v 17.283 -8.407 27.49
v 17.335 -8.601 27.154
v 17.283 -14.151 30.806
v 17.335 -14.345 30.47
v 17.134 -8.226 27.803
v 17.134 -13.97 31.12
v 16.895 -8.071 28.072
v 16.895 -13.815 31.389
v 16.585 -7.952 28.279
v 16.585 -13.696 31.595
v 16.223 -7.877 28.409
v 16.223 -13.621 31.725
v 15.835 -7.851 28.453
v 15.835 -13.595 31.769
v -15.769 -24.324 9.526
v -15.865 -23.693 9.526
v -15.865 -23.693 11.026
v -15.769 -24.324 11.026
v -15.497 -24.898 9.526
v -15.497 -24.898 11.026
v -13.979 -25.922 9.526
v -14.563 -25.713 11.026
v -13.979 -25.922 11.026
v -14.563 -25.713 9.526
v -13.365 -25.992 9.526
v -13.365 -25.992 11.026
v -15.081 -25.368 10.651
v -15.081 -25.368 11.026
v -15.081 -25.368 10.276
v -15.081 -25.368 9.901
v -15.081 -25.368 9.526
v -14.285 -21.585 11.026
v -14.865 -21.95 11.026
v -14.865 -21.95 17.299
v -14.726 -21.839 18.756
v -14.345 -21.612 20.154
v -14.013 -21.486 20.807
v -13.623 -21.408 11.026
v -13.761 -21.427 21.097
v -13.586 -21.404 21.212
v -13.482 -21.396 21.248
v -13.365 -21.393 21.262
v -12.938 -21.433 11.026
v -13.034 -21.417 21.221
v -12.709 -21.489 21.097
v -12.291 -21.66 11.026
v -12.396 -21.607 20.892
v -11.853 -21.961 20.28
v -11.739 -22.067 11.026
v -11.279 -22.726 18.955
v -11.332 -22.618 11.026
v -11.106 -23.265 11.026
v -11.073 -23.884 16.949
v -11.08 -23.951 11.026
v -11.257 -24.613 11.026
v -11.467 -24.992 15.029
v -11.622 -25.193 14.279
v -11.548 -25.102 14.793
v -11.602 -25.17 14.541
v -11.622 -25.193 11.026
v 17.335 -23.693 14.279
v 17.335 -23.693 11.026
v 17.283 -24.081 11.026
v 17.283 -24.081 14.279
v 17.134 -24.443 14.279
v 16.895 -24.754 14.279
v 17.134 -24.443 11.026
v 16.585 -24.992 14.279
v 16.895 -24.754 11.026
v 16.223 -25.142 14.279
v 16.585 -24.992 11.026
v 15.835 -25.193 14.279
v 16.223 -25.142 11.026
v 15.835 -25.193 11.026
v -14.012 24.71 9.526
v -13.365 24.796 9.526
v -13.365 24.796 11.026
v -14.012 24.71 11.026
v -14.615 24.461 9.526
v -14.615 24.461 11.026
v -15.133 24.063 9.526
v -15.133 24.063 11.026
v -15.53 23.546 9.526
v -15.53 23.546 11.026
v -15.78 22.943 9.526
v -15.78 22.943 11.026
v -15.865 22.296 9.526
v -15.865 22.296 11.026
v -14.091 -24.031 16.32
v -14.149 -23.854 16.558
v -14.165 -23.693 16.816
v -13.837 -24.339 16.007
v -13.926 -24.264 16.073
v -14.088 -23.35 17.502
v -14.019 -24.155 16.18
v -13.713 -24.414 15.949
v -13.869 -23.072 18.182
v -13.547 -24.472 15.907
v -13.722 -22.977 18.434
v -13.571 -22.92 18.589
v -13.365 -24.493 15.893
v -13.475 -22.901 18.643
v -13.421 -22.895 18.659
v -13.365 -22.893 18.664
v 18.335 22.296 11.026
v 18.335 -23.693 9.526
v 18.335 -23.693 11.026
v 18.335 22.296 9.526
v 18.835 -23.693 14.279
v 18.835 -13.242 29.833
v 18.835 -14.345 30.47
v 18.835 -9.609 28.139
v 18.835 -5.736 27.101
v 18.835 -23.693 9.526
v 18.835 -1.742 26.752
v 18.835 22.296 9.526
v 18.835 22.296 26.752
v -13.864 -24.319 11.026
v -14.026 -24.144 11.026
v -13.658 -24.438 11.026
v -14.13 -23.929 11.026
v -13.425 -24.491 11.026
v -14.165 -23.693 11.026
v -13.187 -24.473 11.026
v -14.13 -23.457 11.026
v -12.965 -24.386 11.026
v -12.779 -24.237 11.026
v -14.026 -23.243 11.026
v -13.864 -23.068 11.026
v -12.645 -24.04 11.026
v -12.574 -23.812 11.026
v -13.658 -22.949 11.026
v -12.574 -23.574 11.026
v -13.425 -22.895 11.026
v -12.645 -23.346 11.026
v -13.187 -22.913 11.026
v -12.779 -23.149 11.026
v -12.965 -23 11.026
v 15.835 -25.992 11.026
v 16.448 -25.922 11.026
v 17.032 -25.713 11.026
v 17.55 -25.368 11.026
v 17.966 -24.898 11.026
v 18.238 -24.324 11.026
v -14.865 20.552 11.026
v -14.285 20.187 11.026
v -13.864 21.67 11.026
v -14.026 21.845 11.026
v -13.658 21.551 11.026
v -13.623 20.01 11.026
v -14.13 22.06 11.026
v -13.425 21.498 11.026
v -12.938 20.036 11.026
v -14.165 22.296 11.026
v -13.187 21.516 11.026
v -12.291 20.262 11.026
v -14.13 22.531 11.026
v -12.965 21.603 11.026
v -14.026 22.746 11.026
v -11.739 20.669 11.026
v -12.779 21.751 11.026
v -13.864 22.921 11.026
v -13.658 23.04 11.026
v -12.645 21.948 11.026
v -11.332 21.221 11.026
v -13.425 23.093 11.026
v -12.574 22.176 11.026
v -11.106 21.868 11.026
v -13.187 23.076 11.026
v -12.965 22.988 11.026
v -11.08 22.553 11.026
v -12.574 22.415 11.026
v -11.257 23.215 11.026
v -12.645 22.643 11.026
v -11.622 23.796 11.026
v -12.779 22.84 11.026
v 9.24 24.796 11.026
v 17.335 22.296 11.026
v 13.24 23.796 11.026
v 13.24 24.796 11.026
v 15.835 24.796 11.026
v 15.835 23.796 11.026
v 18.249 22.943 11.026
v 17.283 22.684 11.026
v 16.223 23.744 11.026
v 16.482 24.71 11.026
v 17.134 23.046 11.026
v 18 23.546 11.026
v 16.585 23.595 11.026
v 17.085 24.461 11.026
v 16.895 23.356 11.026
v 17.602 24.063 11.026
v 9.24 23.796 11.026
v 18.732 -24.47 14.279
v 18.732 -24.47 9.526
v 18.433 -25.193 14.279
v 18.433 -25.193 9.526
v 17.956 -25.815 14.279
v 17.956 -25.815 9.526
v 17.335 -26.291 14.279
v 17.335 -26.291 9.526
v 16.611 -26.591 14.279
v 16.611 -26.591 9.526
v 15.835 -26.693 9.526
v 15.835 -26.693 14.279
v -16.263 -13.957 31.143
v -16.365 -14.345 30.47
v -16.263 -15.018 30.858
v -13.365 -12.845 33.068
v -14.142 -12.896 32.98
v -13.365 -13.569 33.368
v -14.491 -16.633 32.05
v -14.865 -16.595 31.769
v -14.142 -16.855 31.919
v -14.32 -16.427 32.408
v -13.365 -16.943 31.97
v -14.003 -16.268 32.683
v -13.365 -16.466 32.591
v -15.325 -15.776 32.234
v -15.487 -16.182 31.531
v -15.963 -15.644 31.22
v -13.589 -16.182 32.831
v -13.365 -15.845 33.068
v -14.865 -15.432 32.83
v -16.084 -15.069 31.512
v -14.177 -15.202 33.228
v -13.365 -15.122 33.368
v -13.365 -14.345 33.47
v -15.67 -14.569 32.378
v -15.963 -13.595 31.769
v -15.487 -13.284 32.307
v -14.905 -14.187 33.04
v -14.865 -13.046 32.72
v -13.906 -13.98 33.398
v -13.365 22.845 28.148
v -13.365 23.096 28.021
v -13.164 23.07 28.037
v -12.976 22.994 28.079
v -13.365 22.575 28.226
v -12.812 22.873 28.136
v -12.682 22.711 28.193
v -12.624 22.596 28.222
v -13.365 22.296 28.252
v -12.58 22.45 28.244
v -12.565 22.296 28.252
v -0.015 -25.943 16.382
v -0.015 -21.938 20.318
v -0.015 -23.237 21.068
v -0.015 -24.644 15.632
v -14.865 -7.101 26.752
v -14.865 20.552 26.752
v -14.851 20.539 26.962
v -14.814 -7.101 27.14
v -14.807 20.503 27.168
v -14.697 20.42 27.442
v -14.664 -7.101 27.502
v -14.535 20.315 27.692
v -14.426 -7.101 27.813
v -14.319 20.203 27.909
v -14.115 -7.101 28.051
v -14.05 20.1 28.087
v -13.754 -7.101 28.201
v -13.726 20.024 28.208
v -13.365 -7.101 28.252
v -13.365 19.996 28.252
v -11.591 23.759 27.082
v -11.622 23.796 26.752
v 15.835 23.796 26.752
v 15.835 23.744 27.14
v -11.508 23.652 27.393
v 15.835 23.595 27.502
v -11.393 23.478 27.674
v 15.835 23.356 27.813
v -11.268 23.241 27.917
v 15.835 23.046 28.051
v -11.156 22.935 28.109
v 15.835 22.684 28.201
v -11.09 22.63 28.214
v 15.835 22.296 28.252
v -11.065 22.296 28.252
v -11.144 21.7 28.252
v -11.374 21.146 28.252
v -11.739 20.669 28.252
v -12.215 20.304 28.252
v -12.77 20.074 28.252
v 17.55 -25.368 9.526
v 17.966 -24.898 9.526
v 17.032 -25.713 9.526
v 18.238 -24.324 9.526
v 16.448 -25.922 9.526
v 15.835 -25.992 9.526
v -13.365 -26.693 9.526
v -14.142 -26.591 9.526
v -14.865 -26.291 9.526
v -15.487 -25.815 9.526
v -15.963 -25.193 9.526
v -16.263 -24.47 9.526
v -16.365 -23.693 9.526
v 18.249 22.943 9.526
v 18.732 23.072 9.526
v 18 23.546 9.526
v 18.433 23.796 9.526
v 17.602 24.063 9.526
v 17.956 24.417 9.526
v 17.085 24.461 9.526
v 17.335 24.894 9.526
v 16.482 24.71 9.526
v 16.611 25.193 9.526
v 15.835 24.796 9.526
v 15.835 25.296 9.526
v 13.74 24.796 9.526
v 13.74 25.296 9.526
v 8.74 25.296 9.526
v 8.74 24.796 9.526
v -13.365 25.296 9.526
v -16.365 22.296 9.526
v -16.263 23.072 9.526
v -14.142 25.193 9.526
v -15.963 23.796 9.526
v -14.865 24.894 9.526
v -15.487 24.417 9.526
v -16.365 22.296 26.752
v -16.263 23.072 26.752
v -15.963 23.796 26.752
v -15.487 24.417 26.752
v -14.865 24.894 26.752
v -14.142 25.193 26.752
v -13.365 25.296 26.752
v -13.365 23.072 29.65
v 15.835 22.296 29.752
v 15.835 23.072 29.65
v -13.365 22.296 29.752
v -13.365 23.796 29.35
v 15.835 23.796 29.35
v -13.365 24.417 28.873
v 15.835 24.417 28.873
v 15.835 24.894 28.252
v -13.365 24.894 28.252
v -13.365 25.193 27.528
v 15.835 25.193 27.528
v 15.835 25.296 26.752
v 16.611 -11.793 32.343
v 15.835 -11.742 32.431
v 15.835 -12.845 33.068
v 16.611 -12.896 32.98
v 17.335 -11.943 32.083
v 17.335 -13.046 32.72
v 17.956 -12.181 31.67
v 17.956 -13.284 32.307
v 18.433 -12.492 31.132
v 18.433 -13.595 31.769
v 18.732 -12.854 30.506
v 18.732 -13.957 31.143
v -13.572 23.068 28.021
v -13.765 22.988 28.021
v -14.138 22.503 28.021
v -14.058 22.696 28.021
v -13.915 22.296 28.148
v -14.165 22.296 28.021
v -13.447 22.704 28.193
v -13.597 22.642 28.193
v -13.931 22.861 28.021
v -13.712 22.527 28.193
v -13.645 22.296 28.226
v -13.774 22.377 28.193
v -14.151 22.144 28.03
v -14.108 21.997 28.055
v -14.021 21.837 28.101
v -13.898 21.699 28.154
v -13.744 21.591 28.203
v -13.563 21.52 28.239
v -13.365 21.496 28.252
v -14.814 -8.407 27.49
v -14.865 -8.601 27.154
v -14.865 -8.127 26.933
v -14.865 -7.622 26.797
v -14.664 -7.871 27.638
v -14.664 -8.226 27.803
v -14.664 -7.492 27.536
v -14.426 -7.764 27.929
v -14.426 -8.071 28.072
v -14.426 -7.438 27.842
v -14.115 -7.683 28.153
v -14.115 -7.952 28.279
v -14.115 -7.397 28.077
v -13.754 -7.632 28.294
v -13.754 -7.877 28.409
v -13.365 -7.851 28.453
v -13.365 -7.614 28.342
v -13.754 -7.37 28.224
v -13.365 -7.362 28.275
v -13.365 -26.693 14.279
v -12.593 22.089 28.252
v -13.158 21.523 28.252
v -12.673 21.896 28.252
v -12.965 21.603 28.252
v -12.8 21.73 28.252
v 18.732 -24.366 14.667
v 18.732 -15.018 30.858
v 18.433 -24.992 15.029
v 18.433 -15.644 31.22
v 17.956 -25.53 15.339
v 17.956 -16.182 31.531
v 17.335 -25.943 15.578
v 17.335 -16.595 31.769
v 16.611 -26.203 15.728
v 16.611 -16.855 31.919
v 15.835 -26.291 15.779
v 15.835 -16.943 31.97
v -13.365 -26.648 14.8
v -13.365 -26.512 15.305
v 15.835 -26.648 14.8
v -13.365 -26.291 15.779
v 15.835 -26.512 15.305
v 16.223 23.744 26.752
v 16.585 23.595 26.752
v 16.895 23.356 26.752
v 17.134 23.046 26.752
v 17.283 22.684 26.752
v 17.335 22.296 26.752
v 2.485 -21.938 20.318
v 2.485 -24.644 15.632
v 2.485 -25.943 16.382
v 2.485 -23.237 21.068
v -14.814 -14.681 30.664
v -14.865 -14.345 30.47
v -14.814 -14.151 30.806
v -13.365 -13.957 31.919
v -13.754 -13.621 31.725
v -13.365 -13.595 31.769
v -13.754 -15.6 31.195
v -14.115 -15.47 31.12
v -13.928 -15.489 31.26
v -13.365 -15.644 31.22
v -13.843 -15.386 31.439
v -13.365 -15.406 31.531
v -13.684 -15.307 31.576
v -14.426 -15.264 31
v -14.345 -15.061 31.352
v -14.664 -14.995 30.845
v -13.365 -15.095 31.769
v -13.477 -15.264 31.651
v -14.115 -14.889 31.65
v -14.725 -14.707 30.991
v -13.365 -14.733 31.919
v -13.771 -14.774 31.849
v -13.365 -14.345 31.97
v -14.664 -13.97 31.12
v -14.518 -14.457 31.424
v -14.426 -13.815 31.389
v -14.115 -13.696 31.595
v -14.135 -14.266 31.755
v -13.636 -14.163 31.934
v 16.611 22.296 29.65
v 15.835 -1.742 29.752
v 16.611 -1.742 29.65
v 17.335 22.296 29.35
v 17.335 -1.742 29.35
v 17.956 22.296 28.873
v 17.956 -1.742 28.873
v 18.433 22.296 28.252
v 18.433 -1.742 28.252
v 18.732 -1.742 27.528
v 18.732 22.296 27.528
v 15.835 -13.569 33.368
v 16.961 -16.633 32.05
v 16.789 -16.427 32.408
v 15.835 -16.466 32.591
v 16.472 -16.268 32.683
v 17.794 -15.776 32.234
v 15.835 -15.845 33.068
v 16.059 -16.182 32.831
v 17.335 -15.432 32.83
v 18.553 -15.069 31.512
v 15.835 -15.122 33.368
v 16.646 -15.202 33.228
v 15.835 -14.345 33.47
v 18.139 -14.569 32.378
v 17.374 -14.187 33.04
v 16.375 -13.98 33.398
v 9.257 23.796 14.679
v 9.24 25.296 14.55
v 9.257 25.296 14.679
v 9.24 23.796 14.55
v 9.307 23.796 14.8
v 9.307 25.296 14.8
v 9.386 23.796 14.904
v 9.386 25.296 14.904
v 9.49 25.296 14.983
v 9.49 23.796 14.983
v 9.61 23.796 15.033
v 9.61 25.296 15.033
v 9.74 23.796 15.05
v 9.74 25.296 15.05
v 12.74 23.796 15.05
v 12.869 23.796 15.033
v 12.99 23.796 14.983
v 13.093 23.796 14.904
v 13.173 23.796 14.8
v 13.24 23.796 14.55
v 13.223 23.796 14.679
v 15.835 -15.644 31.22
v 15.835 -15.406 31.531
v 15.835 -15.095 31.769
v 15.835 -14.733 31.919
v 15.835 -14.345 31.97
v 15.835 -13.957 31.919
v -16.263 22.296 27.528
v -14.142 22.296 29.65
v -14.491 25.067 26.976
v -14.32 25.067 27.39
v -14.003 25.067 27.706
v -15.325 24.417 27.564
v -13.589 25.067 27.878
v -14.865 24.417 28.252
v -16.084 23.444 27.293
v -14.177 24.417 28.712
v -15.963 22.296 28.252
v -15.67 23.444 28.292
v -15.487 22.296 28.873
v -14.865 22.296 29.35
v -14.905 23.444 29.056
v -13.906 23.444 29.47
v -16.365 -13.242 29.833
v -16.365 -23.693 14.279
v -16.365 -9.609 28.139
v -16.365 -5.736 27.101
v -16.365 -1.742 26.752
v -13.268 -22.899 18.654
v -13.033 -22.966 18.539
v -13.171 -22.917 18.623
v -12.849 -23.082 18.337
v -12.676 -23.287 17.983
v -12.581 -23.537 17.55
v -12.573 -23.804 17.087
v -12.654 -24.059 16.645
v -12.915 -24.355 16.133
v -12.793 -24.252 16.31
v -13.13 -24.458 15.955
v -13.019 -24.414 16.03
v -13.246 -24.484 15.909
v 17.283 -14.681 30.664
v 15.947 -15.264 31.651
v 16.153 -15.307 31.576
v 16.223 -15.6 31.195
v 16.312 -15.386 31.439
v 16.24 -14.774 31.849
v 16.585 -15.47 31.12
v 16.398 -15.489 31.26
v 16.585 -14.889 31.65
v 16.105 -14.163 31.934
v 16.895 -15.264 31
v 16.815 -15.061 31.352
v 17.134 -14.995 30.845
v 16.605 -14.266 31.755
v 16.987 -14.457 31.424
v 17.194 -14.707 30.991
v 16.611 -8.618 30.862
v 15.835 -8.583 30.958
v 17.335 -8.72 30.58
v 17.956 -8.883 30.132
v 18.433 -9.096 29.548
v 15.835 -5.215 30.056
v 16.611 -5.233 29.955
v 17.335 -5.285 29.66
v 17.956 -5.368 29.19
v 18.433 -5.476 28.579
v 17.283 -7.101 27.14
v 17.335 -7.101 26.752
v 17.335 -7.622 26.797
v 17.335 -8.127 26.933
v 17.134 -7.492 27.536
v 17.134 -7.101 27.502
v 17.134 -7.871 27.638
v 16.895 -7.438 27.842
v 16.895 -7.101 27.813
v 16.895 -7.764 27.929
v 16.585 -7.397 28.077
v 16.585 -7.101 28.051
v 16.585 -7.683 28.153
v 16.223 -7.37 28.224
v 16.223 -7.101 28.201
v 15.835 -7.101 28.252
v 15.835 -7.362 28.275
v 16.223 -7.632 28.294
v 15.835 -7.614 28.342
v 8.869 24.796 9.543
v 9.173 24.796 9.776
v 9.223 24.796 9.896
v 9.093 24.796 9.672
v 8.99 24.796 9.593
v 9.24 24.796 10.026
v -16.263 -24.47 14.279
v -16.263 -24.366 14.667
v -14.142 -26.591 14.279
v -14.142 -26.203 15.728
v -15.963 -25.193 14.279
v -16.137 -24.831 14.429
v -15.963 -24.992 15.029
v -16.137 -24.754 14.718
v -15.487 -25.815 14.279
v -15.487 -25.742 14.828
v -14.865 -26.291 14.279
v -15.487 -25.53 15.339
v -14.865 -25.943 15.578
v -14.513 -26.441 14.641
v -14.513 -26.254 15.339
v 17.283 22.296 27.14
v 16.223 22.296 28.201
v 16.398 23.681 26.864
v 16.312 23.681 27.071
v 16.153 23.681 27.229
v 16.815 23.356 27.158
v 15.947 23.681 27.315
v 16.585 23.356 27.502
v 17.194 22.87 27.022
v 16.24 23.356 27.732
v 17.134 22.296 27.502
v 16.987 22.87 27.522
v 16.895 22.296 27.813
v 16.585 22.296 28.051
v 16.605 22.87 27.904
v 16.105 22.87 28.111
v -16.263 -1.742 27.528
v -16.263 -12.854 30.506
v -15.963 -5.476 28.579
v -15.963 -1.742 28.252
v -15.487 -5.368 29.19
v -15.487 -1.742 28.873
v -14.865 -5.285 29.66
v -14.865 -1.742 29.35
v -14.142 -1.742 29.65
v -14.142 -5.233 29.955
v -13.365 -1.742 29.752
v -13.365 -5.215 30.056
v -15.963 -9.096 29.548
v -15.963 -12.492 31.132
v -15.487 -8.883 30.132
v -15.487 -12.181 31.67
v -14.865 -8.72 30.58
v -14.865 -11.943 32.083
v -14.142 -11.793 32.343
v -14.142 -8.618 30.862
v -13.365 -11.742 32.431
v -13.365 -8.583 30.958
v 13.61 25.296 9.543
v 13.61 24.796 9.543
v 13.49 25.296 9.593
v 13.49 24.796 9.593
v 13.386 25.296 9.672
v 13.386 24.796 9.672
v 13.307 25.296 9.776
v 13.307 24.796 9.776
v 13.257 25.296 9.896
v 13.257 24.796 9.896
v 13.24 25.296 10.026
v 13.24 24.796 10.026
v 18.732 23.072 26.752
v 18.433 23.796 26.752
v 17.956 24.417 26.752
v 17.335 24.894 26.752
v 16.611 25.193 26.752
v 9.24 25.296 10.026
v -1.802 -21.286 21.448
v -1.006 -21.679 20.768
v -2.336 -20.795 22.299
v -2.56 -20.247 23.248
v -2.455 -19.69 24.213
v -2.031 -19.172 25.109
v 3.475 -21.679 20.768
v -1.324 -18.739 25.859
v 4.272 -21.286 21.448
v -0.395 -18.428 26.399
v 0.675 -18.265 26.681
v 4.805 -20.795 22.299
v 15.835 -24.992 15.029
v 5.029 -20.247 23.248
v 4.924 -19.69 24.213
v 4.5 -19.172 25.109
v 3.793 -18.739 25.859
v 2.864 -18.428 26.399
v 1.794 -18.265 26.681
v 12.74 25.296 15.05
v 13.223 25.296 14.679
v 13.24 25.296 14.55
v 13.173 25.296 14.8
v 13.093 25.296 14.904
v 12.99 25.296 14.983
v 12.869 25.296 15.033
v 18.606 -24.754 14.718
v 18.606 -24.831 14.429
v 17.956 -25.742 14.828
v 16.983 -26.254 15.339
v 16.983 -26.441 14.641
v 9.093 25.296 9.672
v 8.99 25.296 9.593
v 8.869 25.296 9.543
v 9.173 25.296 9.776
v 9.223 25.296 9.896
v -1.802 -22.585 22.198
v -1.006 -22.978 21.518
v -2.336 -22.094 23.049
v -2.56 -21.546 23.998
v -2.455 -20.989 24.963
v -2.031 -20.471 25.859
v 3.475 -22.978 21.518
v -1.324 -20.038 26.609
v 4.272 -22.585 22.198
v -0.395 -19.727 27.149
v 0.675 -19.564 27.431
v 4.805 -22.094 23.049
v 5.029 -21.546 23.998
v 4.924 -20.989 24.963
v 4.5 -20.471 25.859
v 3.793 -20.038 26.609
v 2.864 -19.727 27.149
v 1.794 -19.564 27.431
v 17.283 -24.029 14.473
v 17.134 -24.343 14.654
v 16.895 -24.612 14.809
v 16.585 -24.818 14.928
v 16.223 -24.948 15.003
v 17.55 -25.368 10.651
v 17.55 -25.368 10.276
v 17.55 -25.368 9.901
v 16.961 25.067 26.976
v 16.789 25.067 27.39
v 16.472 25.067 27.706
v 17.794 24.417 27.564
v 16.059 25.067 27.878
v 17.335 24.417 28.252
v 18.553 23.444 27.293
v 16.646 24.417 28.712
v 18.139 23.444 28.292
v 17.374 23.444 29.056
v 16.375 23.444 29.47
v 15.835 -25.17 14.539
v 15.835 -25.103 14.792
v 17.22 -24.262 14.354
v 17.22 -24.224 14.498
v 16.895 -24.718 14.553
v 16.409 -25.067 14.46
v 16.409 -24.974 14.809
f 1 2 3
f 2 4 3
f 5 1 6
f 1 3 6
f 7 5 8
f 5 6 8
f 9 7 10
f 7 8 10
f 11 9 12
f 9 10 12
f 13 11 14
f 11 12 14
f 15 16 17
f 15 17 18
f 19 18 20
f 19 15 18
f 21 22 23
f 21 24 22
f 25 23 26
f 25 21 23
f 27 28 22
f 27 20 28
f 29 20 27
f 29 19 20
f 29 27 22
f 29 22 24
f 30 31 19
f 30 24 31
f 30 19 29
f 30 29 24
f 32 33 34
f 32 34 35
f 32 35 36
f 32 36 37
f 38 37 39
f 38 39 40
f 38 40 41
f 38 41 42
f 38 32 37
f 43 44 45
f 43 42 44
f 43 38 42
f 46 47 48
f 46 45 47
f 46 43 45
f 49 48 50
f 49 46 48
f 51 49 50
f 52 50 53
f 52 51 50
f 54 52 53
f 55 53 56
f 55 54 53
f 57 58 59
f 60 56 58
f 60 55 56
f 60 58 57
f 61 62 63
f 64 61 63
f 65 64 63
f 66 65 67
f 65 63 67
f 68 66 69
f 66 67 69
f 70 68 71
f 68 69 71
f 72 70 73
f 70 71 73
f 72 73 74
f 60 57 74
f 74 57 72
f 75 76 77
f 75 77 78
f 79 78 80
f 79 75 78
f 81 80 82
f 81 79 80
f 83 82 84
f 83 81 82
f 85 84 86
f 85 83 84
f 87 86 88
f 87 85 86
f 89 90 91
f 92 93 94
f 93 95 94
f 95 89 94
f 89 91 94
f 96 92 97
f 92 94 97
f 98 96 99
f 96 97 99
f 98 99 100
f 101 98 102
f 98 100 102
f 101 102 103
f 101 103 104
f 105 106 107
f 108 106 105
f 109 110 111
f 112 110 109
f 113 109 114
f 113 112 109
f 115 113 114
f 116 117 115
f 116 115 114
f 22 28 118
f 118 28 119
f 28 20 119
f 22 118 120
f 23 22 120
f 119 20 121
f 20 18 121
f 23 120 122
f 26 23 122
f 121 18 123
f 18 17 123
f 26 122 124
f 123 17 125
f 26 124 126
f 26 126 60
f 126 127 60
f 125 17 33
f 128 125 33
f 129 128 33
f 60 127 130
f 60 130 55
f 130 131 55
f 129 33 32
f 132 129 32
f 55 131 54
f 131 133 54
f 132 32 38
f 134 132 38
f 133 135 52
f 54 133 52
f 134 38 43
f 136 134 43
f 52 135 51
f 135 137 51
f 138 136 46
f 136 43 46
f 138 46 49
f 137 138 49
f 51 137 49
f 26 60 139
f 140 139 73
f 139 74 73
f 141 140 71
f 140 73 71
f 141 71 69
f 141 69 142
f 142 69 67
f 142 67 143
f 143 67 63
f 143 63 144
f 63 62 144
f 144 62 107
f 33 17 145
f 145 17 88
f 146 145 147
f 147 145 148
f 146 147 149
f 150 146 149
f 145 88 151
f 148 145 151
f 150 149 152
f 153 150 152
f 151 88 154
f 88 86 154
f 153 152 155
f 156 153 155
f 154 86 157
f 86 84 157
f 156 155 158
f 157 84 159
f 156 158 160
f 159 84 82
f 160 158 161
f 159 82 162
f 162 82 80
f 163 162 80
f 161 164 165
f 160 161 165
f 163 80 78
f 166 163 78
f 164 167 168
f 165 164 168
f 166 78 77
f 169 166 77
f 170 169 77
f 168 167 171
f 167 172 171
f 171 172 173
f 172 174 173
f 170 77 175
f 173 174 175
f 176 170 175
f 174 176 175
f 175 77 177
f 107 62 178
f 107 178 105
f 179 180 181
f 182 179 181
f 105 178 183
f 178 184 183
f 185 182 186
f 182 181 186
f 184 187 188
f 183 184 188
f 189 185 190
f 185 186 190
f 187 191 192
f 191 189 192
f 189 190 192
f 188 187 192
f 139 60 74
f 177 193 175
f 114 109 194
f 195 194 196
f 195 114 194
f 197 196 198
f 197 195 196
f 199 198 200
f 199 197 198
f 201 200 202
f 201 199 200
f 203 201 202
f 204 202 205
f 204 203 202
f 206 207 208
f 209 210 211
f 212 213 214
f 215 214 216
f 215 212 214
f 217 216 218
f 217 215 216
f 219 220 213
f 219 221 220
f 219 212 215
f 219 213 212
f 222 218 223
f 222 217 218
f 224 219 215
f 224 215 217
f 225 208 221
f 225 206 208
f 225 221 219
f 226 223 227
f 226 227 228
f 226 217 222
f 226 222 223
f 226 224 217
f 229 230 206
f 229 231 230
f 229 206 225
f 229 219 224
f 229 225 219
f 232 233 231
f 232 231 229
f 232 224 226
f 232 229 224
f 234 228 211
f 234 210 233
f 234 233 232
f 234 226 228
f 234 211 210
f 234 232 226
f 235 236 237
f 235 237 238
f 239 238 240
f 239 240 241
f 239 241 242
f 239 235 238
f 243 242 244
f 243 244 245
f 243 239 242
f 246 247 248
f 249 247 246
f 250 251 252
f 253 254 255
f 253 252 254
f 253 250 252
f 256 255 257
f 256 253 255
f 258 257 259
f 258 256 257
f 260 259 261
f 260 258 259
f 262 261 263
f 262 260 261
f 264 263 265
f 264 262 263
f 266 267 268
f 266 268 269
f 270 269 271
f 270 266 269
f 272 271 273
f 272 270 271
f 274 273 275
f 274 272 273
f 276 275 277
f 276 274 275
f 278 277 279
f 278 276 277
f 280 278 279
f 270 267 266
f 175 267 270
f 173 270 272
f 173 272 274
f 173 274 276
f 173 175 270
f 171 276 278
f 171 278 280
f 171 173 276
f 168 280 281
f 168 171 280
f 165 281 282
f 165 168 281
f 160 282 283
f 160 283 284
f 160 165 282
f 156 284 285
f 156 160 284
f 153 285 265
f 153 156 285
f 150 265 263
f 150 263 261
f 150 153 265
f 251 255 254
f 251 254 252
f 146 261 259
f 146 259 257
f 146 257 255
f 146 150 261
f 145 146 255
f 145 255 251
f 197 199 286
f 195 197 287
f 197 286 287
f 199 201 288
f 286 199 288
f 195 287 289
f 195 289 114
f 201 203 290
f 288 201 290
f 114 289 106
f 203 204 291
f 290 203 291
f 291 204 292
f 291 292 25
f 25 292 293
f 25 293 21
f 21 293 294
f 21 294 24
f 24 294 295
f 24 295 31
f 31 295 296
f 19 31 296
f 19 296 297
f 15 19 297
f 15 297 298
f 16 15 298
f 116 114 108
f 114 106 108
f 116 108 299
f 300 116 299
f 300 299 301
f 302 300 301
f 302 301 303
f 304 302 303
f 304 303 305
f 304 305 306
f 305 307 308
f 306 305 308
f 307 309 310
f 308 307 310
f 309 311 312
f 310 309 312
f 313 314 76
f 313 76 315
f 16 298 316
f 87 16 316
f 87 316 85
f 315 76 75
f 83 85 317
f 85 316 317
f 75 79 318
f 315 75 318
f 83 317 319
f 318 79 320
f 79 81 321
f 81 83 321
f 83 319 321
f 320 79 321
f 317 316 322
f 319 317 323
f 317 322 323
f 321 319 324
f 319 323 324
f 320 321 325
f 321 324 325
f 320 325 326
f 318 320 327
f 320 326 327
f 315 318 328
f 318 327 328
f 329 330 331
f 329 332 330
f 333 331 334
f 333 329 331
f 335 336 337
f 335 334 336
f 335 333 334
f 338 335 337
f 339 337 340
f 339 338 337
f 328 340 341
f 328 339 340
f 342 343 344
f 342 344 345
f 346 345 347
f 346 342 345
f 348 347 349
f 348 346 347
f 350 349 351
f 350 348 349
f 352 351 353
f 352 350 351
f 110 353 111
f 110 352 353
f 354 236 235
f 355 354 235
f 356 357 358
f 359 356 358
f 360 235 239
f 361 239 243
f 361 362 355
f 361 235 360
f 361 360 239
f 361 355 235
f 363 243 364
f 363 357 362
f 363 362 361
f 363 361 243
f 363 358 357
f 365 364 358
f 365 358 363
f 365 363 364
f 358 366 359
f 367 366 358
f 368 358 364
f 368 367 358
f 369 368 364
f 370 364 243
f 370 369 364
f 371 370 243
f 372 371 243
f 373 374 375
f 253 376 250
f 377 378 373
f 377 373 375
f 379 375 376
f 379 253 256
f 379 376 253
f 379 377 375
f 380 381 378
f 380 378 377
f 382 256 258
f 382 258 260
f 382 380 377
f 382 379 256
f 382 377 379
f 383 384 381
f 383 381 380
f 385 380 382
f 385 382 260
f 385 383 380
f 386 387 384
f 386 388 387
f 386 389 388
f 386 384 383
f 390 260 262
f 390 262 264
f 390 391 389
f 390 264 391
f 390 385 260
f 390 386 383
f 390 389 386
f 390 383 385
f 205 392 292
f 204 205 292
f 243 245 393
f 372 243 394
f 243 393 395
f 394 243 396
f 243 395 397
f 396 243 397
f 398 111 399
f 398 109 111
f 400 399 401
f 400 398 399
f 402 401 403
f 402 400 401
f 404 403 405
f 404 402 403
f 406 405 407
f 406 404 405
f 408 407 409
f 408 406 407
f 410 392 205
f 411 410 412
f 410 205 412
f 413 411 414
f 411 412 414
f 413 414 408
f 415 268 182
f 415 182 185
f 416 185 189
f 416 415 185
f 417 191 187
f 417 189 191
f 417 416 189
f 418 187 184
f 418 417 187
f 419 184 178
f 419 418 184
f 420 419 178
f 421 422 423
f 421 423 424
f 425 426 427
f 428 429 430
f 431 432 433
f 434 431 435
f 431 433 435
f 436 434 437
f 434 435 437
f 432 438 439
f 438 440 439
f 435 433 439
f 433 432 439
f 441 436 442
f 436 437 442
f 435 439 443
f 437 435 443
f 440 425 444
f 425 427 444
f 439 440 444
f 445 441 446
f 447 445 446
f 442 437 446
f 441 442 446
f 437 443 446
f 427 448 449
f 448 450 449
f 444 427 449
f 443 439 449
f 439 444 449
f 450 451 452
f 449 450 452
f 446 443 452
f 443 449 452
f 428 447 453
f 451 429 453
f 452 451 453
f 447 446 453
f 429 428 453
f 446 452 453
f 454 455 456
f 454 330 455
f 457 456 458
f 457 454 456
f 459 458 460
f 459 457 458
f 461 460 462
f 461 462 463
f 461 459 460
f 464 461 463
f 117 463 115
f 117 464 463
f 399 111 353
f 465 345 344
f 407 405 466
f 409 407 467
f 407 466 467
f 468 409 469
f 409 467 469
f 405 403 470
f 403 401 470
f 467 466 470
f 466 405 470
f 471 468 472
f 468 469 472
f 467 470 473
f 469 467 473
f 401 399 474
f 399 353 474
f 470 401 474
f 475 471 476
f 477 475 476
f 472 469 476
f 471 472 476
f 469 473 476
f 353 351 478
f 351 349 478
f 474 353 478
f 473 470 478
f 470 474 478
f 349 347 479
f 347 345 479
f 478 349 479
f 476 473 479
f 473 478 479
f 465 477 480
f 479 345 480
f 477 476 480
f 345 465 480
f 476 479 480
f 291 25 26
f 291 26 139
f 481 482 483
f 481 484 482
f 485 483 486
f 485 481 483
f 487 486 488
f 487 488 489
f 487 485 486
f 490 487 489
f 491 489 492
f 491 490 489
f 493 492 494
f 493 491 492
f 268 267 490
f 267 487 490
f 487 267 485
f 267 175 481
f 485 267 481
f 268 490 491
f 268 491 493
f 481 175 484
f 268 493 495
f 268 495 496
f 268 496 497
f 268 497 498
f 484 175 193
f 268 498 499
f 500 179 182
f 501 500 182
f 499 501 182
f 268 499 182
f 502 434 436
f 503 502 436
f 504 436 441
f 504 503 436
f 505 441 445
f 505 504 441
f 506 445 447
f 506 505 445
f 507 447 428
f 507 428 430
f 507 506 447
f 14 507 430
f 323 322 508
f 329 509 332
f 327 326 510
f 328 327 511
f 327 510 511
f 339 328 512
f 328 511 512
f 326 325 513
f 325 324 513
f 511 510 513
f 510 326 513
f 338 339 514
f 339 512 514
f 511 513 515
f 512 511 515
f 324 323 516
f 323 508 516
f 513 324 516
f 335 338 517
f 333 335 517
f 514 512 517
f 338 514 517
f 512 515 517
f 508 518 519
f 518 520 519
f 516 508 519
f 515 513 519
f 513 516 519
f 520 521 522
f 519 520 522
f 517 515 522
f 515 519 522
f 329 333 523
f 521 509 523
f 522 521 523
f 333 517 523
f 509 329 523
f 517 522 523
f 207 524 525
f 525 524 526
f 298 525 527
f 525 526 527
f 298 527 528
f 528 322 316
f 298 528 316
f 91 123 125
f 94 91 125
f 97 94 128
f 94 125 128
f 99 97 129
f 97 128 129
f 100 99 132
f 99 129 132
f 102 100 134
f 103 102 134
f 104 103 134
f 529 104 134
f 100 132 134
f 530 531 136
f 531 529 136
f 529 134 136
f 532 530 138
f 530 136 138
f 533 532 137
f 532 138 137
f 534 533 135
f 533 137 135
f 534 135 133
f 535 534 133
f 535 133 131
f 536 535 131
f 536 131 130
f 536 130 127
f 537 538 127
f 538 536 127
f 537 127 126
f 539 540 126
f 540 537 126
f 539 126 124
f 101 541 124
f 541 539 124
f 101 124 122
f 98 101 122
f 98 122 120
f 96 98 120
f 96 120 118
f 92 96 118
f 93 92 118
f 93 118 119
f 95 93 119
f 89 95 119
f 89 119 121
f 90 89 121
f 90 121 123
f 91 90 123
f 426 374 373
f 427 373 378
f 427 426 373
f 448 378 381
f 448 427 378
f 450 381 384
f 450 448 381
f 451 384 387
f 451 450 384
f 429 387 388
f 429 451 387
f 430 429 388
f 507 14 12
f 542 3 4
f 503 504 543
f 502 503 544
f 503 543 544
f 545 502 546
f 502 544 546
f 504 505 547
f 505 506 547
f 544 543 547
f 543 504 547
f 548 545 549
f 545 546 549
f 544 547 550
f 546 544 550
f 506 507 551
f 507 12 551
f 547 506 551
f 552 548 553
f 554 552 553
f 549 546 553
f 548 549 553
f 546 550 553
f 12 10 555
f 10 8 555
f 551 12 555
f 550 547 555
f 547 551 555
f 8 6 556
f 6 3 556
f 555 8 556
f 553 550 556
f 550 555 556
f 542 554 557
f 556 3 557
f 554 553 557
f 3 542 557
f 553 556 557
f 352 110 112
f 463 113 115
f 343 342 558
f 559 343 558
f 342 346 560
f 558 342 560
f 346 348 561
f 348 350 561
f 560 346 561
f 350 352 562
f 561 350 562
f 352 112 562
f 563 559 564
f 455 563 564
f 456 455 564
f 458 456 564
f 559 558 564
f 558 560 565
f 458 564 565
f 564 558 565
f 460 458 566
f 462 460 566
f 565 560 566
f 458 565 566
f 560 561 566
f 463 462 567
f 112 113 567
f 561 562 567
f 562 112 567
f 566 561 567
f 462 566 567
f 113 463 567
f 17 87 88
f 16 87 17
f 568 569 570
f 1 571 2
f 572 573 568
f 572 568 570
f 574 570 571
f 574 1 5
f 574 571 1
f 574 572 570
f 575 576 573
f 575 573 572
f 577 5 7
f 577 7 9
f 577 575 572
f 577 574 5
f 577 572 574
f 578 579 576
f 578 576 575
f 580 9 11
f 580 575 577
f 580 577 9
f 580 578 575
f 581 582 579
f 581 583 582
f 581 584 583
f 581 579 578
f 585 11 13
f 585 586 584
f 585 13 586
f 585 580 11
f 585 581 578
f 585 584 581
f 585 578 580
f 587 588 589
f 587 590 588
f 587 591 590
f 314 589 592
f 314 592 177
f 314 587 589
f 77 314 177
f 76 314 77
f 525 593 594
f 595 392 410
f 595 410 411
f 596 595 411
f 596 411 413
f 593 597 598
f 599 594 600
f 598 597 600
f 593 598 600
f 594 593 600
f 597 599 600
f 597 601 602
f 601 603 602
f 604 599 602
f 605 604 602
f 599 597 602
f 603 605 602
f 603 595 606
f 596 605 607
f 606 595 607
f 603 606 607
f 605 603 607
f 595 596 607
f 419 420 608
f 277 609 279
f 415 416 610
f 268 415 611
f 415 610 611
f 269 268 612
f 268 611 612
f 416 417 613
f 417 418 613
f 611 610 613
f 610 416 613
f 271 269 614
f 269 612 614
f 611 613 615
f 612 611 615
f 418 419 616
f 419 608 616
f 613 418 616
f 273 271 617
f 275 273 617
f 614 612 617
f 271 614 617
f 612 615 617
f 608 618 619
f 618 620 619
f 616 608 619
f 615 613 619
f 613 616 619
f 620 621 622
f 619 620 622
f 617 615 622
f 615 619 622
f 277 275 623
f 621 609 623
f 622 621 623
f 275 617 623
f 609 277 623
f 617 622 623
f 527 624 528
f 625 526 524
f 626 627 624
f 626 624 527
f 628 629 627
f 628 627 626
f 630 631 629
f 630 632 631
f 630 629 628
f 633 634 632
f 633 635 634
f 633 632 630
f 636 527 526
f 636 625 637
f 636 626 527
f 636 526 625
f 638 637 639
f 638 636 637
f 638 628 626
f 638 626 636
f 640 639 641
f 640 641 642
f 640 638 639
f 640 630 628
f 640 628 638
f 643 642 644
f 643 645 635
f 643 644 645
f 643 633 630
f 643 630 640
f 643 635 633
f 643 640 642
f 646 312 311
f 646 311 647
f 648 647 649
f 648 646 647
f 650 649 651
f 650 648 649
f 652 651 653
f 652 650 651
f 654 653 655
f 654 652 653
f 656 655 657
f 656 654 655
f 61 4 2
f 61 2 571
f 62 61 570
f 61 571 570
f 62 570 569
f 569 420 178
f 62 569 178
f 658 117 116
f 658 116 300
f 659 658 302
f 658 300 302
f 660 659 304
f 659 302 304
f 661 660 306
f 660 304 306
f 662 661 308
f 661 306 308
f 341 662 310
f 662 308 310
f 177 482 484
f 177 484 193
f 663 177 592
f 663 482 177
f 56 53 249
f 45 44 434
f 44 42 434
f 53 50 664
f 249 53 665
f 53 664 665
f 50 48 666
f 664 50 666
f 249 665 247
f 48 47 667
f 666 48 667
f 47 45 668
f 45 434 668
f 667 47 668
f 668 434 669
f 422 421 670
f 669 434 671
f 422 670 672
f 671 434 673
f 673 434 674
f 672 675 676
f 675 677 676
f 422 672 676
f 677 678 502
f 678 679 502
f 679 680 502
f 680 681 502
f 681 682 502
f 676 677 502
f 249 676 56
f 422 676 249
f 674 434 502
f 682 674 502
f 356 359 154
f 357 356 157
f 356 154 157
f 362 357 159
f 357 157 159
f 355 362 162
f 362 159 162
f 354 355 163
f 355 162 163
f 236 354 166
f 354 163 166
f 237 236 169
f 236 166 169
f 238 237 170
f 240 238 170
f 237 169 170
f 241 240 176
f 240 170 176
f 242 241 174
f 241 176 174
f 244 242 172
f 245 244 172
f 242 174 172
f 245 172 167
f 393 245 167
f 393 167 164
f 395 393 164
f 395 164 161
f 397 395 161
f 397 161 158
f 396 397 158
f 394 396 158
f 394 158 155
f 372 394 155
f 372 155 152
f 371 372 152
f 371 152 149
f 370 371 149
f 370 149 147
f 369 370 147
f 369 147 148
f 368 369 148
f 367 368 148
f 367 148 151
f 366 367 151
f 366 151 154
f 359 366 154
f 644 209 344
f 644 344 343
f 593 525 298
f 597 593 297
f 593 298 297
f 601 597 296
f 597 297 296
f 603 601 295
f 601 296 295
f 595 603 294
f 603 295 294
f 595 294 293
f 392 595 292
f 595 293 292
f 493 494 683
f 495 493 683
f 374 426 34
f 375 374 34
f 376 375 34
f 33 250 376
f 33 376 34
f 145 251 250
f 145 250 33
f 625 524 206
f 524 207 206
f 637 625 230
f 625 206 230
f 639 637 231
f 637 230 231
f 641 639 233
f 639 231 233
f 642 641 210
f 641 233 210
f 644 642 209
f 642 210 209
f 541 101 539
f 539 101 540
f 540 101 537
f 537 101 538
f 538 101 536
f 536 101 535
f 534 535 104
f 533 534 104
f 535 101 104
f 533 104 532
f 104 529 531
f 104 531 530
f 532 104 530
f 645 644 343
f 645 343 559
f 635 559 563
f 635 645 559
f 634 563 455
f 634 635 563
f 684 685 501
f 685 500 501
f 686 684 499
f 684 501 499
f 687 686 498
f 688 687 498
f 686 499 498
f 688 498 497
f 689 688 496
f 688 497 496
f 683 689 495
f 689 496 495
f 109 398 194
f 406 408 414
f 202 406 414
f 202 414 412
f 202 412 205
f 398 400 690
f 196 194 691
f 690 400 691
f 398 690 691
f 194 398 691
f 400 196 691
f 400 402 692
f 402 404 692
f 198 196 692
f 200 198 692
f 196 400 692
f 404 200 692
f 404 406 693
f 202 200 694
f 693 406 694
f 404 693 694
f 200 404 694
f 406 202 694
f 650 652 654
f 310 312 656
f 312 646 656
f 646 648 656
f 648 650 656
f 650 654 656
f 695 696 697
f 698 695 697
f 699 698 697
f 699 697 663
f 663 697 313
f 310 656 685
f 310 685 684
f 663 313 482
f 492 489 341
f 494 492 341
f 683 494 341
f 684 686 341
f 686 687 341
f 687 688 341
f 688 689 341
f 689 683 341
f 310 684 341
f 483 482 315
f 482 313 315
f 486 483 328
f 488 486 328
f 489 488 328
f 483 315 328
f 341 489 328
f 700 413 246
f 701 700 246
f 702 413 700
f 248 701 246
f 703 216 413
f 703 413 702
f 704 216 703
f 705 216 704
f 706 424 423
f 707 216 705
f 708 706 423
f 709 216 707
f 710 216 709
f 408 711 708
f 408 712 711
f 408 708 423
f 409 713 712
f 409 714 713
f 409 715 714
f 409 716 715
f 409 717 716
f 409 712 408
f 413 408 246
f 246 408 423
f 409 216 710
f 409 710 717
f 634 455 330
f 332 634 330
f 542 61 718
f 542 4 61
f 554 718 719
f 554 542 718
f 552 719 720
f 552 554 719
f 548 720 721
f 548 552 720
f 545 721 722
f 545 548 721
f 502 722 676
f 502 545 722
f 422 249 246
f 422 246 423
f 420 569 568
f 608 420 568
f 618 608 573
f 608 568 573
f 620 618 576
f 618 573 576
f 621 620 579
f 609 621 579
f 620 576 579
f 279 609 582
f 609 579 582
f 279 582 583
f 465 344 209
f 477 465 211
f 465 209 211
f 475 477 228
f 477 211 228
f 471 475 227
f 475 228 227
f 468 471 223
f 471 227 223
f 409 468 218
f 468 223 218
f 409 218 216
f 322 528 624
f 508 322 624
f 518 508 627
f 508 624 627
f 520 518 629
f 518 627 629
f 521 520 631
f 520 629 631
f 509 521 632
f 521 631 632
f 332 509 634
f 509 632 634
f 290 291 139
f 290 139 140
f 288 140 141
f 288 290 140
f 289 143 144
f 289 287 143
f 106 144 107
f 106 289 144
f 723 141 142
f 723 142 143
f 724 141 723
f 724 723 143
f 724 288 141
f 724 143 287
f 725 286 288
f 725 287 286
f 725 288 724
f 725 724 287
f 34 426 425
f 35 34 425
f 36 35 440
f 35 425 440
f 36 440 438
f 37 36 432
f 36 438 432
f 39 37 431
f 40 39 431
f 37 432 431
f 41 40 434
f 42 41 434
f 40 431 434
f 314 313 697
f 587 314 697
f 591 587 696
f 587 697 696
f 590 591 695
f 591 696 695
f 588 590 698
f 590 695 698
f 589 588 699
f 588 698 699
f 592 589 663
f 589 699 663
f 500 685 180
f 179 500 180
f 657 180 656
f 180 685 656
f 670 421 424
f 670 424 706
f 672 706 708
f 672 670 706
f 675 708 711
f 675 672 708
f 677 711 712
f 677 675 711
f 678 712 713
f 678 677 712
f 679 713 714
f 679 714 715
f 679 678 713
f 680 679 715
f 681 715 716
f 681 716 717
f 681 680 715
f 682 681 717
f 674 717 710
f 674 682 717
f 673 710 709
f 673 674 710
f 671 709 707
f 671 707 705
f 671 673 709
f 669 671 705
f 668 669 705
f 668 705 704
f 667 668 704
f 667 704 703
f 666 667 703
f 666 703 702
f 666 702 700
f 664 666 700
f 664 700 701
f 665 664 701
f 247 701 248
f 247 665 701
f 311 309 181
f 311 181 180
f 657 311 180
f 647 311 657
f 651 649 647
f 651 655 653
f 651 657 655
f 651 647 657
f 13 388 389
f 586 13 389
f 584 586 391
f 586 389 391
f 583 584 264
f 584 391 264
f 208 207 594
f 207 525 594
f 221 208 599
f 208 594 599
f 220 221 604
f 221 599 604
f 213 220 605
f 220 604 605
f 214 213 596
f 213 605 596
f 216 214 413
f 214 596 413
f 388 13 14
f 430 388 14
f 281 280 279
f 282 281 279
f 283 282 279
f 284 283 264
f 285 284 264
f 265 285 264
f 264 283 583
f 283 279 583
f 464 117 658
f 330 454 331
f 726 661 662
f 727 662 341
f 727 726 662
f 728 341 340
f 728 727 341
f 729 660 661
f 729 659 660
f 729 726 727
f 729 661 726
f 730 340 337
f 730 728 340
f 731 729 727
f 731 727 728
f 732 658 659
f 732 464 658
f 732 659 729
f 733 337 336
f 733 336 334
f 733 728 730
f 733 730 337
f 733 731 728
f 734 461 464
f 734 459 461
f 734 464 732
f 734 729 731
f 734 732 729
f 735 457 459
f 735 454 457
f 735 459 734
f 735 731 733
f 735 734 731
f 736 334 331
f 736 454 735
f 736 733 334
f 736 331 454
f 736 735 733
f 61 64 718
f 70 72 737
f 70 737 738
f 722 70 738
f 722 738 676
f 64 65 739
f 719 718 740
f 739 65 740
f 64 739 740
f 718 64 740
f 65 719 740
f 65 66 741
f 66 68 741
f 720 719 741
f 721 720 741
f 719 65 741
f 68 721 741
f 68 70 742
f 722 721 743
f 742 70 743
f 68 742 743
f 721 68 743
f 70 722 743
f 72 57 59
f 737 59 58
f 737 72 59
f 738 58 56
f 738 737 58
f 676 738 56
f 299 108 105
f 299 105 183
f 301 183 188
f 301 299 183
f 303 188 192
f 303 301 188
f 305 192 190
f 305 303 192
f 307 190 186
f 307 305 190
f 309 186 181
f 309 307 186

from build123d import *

# Parameters (mm, degrees)
SKETCH1_W           = 32.2
SKETCH1_H           = 21
BOSS_EXTRUDE2_DEPTH = 1.5
BOSS_EXTRUDE3_DEPTH = 1.5
BOSS_EXTRUDE4_DEPTH = 1.5
BOSS_EXTRUDE5_DEPTH = 35.2
SKETCH5_W           = 35.2
SKETCH5_H           = 5.556871517
BOSS_EXTRUDE6_DEPTH = 1.5
SKETCH6_W           = 35.2
SKETCH6_H           = 20.226133569
BOSS_EXTRUDE7_DEPTH = 1.5
FILLET3_R           = 20
FILLET_EXTERIOR_R   = 3
FILLET_INTERIOR_R   = 1.5
SKETCH7_W           = 4
SKETCH7_H           = 8.5
CUT_EXTRUDE1_DEPTH  = 1.5
FILLET4_R           = 0.5
CUT_EXTRUDE2_DEPTH  = 1.5
SCREW_BOSS1_REACH   = 41.636
SKETCH10_R          = 2.3
SKETCH10_R_2        = 0.8
SCREW_BOSS2_REACH   = 41.636
SKETCH11_R          = 2.3
SKETCH11_R_2        = 0.8


with BuildPart() as part:
    # Sketch1 → Boss-Extrude2 (new body)
    with BuildSketch(Plane(origin=(0, -25.251844214, 14.579159054), x_dir=(1, 0, 0), z_dir=(3.491481338843128e-15, -0.866025403784445, 0.4999999999999889))):
        with Locations((1.234580757, 10.21530973)):
            Rectangle(SKETCH1_W, SKETCH1_H)
        with BuildLine():
            Line((-0.015419243, 1.21530973), (2.484580757, 1.21530973))
            Line((2.484580757, 1.21530973), (2.484580757, 6.626786357))
            ThreePointArc((2.484580757, 6.626786357), (1.234580757, 14.01530973), (-0.015419243, 6.626786357))
            Line((-0.015419243, 6.626786357), (-0.015419243, 1.21530973))
        make_face(mode=Mode.SUBTRACT)
    extrude(amount=BOSS_EXTRUDE2_DEPTH)

    # Sketch2 → Boss-Extrude3 (add)
    with BuildSketch(Plane(origin=(17.334580757, 0, 0), x_dir=(0, 0, -1), z_dir=(1, 0, 0))):
        Polygon((-15.082610048, -26.693227454), (-9.525738531, -26.693227454), (-9.525738531, 25.295602697), (-28.2518721, 25.295602697), (-28.2518721, -7.503058425), (-33.269143528, -16.193227454), align=None)
    extrude(amount=BOSS_EXTRUDE3_DEPTH)

    # Sketch3 → Boss-Extrude4 (add)
    with BuildSketch(Plane.ZY.offset(14.865419243)):
        Polygon((28.2518721, 25.295602697), (28.2518721, -7.503058425), (33.269143528, -16.193227454), (15.082610048, -26.693227454), (9.525738531, -26.693227454), (9.525738531, 25.295602697), align=None)
    extrude(amount=BOSS_EXTRUDE4_DEPTH)

    # Sketch4 → Boss-Extrude5 (add)
    with BuildSketch(Plane(origin=(18.834580757, 0, 0), x_dir=(0, 0, -1), z_dir=(1, 0, 0))):
        Polygon((-28.2518721, -7.503058425), (-33.269143528, -16.193227454), (-34.568181634, -15.443227454), (-29.7518721, -7.101134637), (-29.7518721, 25.295602697), (-28.2518721, 25.295602697), align=None)
    extrude(amount=-BOSS_EXTRUDE5_DEPTH)

    # Sketch5 → Boss-Extrude6 (add)
    with BuildSketch(Plane.XZ.offset(26.693227454)):
        with Locations((1.234580757, 12.30417429)):
            Rectangle(SKETCH5_W, SKETCH5_H)
    extrude(amount=-BOSS_EXTRUDE6_DEPTH)

    # Sketch6 → Boss-Extrude7 (add)
    with BuildSketch(Plane(origin=(0, 25.295602697, 0), x_dir=(1, 0, 0), z_dir=(0, 1, 0))):
        with Locations((1.234580757, -19.638805316)):
            Rectangle(SKETCH6_W, SKETCH6_H)
    extrude(amount=-BOSS_EXTRUDE7_DEPTH)

    # Fillet3
    fillet3_edges = [part.edges().sort_by_distance(p)[0] for p in [
        (1.234580757, -7.101134637, 29.7518721),
    ]]
    fillet(fillet3_edges, radius=FILLET3_R)

    # Fillet-Exterior
    fillet_exterior_edges = [part.edges().sort_by_distance(p)[0] for p in [
        (-16.365419243, 11.776725954, 29.7518721),
        (18.834580757, -13.592689121, 33.499772829),
        (18.834580757, -6.91853169, 30.433355574),
        (-16.365419243, -6.91853169, 30.433355574),
        (1.234580757, -26.693227454, 15.082610048),
        (18.834580757, -21.068227454, 24.825395841),
        (18.834580757, -26.693227454, 12.30417429),
        (18.834580757, 25.295602697, 19.638805315),
        (-16.365419243, 25.295602697, 19.638805315),
        (-16.365419243, -26.693227454, 12.30417429),
        (-16.365419243, -21.068227454, 24.825395841),
        (1.234580757, -15.443227454, 34.568181634),
        (1.234580757, 25.295602697, 29.7518721),
        (18.834580757, 11.776725954, 29.7518721),
        (-16.365419243, -13.592689121, 33.499772829),
    ]]
    fillet(fillet_exterior_edges, radius=FILLET_EXTERIOR_R)

    # Fillet-Interior
    fillet_interior_edges = [part.edges().sort_by_distance(p)[0] for p in [
        (17.334580757, 8.146272136, 28.2518721),
        (17.334580757, 23.795602697, 18.888805315),
        (-14.865419243, 23.795602697, 18.888805315),
        (1.234580757, 23.795602697, 28.2518721),
        (17.334580757, -11.198623887, 30.385507814),
        (-14.865419243, -11.198623887, 30.385507814),
        (-14.865419243, 8.146272136, 28.2518721),
        (-14.865419243, -20.043708401, 23.599914894),
        (1.234580757, -14.894189349, 32.519143528),
        (1.234580757, -7.503058425, 28.2518721),
        (-14.865419243, -25.193227454, 12.103212395),
        (17.334580757, -20.043708401, 23.599914894),
        (1.234580757, -25.193227454, 14.68068626),
        (17.334580757, -25.193227454, 12.103212395),
    ]]
    fillet(fillet_interior_edges, radius=FILLET_INTERIOR_R)

    # Sketch7 → Cut-Extrude1 (cut)
    with BuildSketch(Plane(origin=(0, 25.295602697, 0), x_dir=(1, 0, 0), z_dir=(0, 1, 0))):
        with Locations((11.239580757, -10.8)):
            Rectangle(SKETCH7_W, SKETCH7_H)
    extrude(amount=-CUT_EXTRUDE1_DEPTH, mode=Mode.SUBTRACT)

    # Fillet4
    fillet4_edges = [part.edges().sort_by_distance(p)[0] for p in [
        (9.239580757, 24.545602697, 9.525738531),
        (9.239580757, 24.545602697, 15.05),
        (13.239580757, 24.545602697, 9.525738531),
        (13.239580757, 24.545602697, 15.05),
    ]]
    fillet(fillet4_edges, radius=FILLET4_R)

    # Sketch9 → Cut-Extrude2 (cut)
    with BuildSketch(Plane(origin=(0, 0, 9.525738531), x_dir=(-1, 0, 0), z_dir=(0, 0, -1))):
        with BuildLine():
            Line((13.365419243, -25.99226556), (-15.834580757, -25.99226556))
            add(Edge.make_bspline(
                [(-15.834580757, -25.99226556), (-16.142981162, -25.99226556), (-16.764416225, -25.886824157), (-17.587620167, -25.41563579), (-18.184470703, -24.656923007), (-18.334580757, -24.010728961), (-18.334580757, -23.693227454)],
                knots=[0, 0, 0, 0, 0.392699082, 0.785398163, 1.178097245, 1.570796327, 1.570796327, 1.570796327, 1.570796327], degree=3))
            Line((-18.334580757, -23.693227454), (-18.334580757, 22.295602697))
            ThreePointArc((-18.334580757, 22.295602697), (-17.60234771, 24.06336965), (-15.834580757, 24.795602697))
            Line((-15.834580757, 24.795602697), (13.365419243, 24.795602697))
            ThreePointArc((13.365419243, 24.795602697), (15.133186196, 24.06336965), (15.865419243, 22.295602697))
            Line((15.865419243, 22.295602697), (15.865419243, -23.693227454))
            add(Edge.make_bspline(
                [(15.865419243, -23.693227454), (15.865419243, -24.010728961), (15.715309189, -24.656923007), (15.118458653, -25.41563579), (14.295254711, -25.886824157), (13.673819649, -25.99226556), (13.365419243, -25.99226556)],
                knots=[1.570796327, 1.570796327, 1.570796327, 1.570796327, 1.963495408, 2.35619449, 2.748893572, 3.141592654, 3.141592654, 3.141592654, 3.141592654], degree=3))
        make_face()
        with BuildLine():
            Line((14.865419243, 22.295602697), (14.865419243, -23.693227454))
            add(Edge.make_bspline(
                [(13.365419243, -24.99226556), (14.865419243, -24.99226556), (14.865419243, -23.693227454)],
                knots=[1.570796327, 1.570796327, 1.570796327, 3.141592654, 3.141592654, 3.141592654], degree=2, weights=[1, 0.707106781, 1]))
            Line((13.365419243, -24.99226556), (-15.834580757, -24.99226556))
            add(Edge.make_bspline(
                [(-17.334580757, -23.693227454), (-17.334580757, -24.99226556), (-15.834580757, -24.99226556)],
                knots=[0, 0, 0, 1.570796327, 1.570796327, 1.570796327], degree=2, weights=[1, 0.707106781, 1]))
            Line((-17.334580757, -23.693227454), (-17.334580757, 22.295602697))
            ThreePointArc((-17.334580757, 22.295602697), (-16.895240929, 23.356262868), (-15.834580757, 23.795602697))
            Line((-15.834580757, 23.795602697), (13.365419243, 23.795602697))
            ThreePointArc((13.365419243, 23.795602697), (14.426079415, 23.356262868), (14.865419243, 22.295602697))
        make_face(mode=Mode.SUBTRACT)
    extrude(amount=-CUT_EXTRUDE2_DEPTH, mode=Mode.SUBTRACT)

    # Screw-Boss1: up to this face of the body (flat: up to its plane)
    screw_boss1_end = Plane(part.part.faces().sort_by_distance((1.234580757, 7.59723403, 28.2518721))[0])
    # Sketch10 → Screw-Boss1 (add, up to the picked face)
    with BuildSketch(Plane(origin=(0, 0, 11.025738531), x_dir=(-1, 0, 0), z_dir=(0, 0, -1)), mode=Mode.PRIVATE) as screw_boss1_sk1:
        with Locations((13.365419243, 22.295602697)):
            Circle(SKETCH10_R)
        with Locations((13.365419243, 22.295602697)):
            Circle(SKETCH10_R_2, mode=Mode.SUBTRACT)
    screw_boss1_tool1 = split(extrude(screw_boss1_sk1.sketch, amount=-SCREW_BOSS1_REACH, mode=Mode.PRIVATE), bisect_by=screw_boss1_end, keep=Keep.BOTH, mode=Mode.PRIVATE)
    add(screw_boss1_tool1.solids().sort_by(Axis((-11.130473, 22.295603, 11.025739), (0, 0, 1)))[0])

    # Screw-Boss2: up to this plane
    screw_boss2_end = Plane(origin=(0, -25.251844214, 14.579159054), z_dir=(3.5680069050429865e-15, -0.8660254037844453, 0.49999999999998884))
    # Sketch11 → Screw-Boss2 (add, up to the surface)
    with BuildSketch(Plane(origin=(0, 0, 11.025738531), x_dir=(-1, 0, 0), z_dir=(0, 0, -1)), mode=Mode.PRIVATE) as screw_boss2_sk1:
        with Locations((13.365419243, -23.693227454)):
            Circle(SKETCH11_R)
        with Locations((13.365419243, -23.693227454)):
            Circle(SKETCH11_R_2, mode=Mode.SUBTRACT)
    screw_boss2_tool1 = split(extrude(screw_boss2_sk1.sketch, amount=-SCREW_BOSS2_REACH, mode=Mode.PRIVATE), bisect_by=screw_boss2_end, keep=Keep.BOTH, mode=Mode.PRIVATE)
    add(screw_boss2_tool1.solids().sort_by_distance((-11.130473, -23.693227, 11.025739))[0])


solid = part.part
